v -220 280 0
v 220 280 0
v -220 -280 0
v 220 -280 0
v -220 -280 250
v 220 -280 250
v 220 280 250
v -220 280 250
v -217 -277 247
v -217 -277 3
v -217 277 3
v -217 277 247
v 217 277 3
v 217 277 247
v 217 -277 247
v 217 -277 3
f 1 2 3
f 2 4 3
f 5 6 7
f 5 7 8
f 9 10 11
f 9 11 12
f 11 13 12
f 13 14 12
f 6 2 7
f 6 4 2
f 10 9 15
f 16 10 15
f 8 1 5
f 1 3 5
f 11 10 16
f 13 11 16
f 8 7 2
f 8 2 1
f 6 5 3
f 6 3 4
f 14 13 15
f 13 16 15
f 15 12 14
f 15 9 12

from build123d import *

# Parameters (mm, degrees)
F0_W     = 440
F0_H     = 250
F0_W_2   = 434
F0_H_2   = 244
F1_DEPTH = 277
F2_W     = 440
F2_H     = 250
F3_DEPTH = 3
F4_W     = 440
F4_H     = 250
F5_DEPTH = 3


with BuildPart() as f1:
    # F0 (on Front) → F1 (new body, symmetric)
    with BuildSketch(Plane.XZ):
        with Locations((0, 125)):
            Rectangle(F0_W, F0_H)
        with Locations((0, 125)):
            Rectangle(F0_W_2, F0_H_2, mode=Mode.SUBTRACT)
    extrude(amount=F1_DEPTH, both=True)

    # F2 (on face) → F3 (join)
    with BuildSketch(Plane.XZ.offset(277)):
        with Locations((0, 125)):
            Rectangle(F2_W, F2_H)
    extrude(amount=F3_DEPTH)

    # F4 (on face) → F5 (join)
    with BuildSketch(Plane(origin=(0, 277, 0), x_dir=(-1, 0, 0), z_dir=(0, 1, 0))):
        with Locations((0, 125)):
            Rectangle(F4_W, F4_H)
    extrude(amount=F5_DEPTH)


solid = f1.part
